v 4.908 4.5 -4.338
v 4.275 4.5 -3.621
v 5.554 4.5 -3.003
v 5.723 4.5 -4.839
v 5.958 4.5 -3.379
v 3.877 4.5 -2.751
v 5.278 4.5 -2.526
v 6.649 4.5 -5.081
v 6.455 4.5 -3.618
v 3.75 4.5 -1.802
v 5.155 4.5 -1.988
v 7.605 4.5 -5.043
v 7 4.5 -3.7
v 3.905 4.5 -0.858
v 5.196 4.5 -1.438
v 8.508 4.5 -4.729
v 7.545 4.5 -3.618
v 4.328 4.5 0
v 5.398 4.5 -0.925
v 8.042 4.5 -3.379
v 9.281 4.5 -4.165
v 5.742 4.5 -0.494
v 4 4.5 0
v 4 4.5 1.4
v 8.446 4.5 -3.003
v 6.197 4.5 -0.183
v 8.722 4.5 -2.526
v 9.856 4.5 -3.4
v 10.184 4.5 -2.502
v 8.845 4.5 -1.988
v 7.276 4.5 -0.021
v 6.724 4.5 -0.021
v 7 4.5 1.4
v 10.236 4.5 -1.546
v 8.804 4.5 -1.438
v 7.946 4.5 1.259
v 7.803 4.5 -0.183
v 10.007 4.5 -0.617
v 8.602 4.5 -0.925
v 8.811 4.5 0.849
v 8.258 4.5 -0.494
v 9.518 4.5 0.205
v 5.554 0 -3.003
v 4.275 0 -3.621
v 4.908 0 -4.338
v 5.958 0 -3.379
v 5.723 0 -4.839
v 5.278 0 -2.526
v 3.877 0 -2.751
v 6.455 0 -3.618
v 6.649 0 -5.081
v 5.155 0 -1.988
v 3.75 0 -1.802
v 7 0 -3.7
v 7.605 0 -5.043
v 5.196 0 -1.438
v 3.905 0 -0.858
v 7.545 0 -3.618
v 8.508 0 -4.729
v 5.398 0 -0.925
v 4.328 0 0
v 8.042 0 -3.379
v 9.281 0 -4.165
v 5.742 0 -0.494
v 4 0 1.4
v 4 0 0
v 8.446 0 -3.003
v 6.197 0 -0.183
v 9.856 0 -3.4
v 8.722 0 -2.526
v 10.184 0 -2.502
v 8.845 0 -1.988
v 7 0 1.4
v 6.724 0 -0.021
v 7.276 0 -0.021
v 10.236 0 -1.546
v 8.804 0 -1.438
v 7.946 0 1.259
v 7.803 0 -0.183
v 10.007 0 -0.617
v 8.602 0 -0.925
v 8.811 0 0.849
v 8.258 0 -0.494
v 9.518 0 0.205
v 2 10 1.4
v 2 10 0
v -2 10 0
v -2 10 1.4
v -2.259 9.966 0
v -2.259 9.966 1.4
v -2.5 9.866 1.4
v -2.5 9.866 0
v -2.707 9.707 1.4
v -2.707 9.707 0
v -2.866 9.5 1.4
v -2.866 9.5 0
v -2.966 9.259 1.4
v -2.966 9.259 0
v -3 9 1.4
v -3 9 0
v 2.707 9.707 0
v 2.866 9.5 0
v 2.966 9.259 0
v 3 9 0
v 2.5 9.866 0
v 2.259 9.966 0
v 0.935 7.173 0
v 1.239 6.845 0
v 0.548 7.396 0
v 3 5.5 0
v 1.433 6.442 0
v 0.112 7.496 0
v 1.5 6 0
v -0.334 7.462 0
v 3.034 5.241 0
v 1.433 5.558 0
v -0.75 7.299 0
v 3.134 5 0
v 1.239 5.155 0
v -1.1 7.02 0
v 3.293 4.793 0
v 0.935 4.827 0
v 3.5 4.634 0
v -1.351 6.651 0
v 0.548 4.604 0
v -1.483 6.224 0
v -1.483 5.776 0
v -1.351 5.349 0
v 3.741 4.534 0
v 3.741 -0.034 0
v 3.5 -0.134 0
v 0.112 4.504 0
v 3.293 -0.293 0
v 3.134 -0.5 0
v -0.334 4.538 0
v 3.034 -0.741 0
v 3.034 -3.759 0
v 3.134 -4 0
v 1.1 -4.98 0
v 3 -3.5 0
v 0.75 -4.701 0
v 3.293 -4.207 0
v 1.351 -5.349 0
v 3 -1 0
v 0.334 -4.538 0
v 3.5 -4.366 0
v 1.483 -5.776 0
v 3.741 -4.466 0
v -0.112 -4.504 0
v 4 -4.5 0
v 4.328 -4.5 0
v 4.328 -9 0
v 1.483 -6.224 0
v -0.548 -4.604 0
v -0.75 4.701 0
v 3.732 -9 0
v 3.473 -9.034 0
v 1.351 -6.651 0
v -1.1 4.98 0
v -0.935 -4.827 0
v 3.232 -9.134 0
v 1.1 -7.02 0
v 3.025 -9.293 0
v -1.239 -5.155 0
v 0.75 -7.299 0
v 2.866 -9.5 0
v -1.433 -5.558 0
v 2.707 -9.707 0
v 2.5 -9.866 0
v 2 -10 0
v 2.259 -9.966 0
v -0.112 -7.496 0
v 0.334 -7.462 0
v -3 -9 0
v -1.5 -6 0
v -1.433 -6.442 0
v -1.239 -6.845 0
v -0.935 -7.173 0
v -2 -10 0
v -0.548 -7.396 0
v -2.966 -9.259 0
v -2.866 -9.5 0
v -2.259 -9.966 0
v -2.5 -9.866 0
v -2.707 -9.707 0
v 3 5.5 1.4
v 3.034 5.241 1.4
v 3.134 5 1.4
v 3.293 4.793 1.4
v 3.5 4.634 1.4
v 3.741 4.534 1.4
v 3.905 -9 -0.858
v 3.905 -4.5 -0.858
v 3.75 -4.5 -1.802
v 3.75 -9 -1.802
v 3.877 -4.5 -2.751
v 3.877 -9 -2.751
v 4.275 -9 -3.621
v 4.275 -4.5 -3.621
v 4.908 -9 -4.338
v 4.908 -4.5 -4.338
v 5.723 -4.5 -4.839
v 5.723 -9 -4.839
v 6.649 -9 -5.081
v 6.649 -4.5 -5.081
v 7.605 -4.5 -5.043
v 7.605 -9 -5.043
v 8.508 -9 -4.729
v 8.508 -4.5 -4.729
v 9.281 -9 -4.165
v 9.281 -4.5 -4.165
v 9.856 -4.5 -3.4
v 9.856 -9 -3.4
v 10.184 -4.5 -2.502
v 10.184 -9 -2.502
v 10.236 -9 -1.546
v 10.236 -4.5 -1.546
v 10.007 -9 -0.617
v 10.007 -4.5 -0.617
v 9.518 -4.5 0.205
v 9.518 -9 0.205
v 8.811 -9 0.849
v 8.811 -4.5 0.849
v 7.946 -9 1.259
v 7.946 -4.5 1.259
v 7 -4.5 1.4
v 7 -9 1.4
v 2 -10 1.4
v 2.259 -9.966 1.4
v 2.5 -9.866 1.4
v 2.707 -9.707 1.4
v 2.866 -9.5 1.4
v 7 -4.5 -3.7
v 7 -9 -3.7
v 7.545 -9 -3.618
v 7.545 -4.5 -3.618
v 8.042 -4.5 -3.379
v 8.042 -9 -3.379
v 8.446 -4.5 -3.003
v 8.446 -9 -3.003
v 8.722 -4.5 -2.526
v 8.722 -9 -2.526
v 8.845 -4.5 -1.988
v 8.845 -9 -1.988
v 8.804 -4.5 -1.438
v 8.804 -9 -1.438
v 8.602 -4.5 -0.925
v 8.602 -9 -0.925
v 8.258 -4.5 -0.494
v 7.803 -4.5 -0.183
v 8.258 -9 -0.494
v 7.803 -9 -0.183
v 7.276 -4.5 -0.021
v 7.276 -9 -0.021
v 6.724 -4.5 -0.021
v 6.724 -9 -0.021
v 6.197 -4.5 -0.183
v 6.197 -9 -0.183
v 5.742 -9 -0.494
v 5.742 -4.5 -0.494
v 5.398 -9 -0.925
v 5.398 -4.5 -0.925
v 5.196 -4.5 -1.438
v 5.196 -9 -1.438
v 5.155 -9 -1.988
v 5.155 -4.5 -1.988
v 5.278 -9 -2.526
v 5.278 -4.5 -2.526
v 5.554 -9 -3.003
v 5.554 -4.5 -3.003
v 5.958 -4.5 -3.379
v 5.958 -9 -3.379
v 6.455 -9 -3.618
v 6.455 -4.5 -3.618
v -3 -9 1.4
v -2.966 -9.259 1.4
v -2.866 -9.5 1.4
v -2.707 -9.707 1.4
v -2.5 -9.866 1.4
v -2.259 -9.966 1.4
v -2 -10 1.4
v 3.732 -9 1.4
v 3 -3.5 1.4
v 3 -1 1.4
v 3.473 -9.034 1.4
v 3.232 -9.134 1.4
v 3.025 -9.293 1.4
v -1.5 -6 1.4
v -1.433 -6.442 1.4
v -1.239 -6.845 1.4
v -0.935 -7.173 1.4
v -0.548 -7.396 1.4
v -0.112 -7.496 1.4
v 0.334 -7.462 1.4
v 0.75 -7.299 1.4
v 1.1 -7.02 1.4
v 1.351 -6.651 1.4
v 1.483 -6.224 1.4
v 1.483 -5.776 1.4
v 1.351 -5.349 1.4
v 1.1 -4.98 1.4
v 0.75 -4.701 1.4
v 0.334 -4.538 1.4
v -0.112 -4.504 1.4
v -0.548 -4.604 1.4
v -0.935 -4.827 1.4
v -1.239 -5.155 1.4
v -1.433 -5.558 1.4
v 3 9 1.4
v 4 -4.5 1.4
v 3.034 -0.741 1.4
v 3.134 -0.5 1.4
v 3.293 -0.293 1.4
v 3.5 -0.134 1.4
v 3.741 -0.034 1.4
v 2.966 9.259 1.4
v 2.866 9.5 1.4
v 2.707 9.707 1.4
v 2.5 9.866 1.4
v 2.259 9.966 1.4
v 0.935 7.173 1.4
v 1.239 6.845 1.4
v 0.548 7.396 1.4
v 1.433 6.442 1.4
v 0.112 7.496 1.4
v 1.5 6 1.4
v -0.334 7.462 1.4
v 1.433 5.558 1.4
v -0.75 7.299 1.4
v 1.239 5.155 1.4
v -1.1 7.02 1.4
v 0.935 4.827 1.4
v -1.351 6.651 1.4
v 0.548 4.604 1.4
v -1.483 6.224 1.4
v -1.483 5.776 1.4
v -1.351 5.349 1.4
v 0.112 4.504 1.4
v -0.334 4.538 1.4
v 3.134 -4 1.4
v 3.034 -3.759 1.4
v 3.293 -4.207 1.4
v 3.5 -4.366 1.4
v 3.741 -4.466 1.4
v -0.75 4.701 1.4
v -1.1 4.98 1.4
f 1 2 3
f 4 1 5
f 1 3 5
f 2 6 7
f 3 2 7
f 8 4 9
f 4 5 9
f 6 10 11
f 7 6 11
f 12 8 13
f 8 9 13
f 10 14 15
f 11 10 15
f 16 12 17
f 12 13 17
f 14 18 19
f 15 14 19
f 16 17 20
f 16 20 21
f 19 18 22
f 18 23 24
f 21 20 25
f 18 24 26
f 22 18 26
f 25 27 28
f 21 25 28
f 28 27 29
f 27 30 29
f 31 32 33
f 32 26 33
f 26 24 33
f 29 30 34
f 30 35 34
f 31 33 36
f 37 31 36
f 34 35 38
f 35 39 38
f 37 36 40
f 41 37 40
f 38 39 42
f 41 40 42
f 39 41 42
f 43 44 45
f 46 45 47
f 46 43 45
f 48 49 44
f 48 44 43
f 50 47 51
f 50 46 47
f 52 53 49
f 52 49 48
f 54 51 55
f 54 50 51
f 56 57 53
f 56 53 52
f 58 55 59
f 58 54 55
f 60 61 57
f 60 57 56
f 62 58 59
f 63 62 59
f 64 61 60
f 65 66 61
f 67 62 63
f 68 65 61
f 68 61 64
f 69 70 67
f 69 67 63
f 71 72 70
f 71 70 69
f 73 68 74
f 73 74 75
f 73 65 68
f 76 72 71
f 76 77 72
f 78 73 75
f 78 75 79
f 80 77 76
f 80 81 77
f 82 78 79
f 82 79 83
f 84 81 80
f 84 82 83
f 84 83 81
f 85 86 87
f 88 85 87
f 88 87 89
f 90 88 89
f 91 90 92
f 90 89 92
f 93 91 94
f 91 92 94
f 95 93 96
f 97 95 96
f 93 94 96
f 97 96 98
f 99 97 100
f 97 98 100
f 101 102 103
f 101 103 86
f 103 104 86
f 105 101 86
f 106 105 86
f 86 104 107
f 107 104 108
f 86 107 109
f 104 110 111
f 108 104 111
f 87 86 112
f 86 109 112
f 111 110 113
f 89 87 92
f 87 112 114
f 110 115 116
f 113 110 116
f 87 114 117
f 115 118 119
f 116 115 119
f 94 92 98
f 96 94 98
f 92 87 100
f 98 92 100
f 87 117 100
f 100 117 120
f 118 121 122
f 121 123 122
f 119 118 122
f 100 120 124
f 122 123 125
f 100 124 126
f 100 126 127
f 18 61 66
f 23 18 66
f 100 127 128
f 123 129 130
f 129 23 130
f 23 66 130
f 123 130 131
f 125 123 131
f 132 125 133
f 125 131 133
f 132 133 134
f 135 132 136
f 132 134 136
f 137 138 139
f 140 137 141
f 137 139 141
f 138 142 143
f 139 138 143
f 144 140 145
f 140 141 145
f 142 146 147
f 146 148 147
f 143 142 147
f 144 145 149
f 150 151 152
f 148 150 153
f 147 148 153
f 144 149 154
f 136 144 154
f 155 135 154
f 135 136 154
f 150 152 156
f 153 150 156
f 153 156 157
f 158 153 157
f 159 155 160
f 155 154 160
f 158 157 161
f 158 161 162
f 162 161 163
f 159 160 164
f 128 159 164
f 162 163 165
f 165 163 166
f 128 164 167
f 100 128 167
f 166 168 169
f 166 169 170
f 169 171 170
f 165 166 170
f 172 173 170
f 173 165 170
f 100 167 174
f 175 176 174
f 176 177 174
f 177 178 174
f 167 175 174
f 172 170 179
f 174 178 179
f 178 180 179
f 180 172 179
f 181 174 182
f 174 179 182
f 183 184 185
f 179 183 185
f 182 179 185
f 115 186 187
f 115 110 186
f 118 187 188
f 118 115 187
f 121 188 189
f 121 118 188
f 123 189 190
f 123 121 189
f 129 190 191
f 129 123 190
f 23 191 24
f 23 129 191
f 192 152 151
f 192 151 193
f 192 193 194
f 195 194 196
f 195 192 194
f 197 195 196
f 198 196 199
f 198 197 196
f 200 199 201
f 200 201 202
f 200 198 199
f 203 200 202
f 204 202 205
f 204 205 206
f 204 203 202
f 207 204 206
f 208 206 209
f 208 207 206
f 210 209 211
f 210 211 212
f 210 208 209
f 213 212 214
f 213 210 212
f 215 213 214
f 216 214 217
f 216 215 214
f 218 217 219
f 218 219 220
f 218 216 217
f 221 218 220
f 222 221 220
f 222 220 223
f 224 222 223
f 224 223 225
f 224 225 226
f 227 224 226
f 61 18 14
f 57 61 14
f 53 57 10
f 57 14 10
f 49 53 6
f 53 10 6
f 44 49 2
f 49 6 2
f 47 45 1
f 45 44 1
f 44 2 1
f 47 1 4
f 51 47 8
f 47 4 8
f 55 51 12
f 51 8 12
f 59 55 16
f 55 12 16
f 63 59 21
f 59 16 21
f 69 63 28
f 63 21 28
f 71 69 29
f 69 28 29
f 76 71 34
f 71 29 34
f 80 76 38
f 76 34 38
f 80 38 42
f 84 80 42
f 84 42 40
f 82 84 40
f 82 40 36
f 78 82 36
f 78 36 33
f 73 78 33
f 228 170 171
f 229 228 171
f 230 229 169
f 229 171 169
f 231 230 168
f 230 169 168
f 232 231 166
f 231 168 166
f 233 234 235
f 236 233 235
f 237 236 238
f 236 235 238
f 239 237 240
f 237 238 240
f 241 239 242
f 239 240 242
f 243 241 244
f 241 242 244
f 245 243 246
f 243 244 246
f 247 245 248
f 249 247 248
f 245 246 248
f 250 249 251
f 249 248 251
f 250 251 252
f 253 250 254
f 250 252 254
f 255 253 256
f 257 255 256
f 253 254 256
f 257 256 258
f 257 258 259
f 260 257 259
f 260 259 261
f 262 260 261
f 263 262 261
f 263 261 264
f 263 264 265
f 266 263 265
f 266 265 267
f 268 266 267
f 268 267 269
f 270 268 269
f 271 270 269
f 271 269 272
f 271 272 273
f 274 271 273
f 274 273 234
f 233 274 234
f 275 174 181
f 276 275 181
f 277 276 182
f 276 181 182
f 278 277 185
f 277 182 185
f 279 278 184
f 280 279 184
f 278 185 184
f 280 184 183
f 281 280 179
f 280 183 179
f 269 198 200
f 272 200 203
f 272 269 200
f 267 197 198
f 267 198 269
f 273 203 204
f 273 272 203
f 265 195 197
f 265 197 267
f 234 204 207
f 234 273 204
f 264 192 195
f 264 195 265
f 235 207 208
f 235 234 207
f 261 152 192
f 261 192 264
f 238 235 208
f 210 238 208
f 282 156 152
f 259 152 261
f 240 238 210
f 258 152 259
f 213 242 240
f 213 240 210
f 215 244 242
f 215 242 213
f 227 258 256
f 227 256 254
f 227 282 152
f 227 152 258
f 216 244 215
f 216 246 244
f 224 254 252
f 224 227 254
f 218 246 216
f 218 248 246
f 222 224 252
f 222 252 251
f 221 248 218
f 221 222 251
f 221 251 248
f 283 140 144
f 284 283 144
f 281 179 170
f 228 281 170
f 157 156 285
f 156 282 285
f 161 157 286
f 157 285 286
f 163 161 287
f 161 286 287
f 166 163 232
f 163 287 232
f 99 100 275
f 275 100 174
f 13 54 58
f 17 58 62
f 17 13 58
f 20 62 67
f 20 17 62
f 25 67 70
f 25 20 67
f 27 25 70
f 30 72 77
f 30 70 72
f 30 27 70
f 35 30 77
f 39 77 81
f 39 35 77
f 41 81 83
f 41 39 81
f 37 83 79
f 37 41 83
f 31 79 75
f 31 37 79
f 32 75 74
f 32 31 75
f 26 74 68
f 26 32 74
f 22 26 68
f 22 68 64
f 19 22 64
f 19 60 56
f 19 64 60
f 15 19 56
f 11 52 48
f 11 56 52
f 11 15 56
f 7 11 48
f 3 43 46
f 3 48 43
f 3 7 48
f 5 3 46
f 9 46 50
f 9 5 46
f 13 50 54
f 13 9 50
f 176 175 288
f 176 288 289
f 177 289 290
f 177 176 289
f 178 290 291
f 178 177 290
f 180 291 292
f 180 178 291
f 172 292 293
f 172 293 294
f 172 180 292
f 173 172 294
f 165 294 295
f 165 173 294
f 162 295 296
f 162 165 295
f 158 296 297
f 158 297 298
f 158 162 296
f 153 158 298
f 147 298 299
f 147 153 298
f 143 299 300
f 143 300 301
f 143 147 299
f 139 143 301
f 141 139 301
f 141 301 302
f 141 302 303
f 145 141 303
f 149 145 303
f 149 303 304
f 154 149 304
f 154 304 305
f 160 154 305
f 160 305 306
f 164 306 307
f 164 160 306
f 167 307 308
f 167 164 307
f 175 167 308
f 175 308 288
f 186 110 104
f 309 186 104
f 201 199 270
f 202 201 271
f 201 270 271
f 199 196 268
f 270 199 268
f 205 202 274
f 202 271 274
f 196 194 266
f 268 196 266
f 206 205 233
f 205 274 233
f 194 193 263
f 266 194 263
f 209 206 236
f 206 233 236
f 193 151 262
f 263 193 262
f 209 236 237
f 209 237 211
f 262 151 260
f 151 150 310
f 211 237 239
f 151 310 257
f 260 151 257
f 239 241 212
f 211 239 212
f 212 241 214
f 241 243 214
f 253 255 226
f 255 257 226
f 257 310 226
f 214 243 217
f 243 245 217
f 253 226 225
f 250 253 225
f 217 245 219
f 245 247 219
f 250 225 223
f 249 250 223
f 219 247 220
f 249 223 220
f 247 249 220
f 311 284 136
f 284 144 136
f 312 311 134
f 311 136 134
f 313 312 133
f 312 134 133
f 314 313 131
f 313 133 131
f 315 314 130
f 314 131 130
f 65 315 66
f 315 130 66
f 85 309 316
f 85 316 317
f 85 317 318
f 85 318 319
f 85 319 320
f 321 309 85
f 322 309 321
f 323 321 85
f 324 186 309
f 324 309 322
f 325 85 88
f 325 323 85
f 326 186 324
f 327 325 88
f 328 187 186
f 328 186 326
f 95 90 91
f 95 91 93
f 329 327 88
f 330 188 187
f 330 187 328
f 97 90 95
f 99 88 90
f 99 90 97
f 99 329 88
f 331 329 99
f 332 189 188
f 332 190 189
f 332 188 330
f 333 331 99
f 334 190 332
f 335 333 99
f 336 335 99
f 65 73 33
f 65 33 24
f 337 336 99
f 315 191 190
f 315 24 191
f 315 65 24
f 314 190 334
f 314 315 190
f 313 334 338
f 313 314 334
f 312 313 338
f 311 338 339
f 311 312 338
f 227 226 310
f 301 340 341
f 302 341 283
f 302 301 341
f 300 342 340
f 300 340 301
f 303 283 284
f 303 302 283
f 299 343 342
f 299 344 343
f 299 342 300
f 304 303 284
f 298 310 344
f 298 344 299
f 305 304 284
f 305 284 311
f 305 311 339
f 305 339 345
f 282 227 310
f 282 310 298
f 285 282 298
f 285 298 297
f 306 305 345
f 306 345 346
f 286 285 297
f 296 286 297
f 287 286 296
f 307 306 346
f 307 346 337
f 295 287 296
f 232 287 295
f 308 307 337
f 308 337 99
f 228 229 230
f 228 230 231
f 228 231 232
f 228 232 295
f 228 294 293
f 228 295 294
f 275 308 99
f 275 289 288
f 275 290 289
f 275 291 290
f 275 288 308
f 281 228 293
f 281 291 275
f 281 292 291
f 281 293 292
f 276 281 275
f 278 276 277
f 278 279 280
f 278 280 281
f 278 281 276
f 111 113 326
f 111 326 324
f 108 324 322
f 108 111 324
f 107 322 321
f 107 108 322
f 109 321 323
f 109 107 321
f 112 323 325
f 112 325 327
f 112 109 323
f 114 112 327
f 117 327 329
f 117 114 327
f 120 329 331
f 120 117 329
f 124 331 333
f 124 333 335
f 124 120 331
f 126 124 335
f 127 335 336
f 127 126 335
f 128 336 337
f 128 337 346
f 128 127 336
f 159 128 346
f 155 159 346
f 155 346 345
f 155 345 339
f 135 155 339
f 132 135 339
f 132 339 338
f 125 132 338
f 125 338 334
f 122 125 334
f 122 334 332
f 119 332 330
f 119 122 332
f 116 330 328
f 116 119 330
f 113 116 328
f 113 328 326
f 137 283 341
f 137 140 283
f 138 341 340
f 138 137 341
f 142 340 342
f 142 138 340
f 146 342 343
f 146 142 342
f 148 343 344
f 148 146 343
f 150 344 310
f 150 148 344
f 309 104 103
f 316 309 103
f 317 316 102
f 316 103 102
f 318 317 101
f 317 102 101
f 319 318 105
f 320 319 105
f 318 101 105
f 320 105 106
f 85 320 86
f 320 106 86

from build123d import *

# Parameters (mm, degrees)
SKETCH_1_R      = 1.5
EXTRUDE_1_DEPTH = 1.4
SKETCH_4_W      = 4
SKETCH_4_H      = 1.4
EXTRUDE_2_DEPTH = 4.5
SKETCH_5_R      = 3.25
SKETCH_5_R_2    = 1.85
EXTRUDE_3_DEPTH = 4.5
FILLET_1_R      = 1


with BuildPart() as part:
    # 草图1 → 凸台-拉伸1 (new body)
    with BuildSketch(Plane.XY):
        with BuildLine():
            Line((-2, -10), (2, -10))
            ThreePointArc((2, -10), (2.707106781, -9.707106781), (3, -9))
            Line((3, -9), (3, 9))
            ThreePointArc((3, 9), (2.707106781, 9.707106781), (2, 10))
            Line((2, 10), (-2, 10))
            ThreePointArc((-2, 10), (-2.707106781, 9.707106781), (-3, 9))
            Line((-3, 9), (-3, -9))
            ThreePointArc((-3, -9), (-2.707106781, -9.707106781), (-2, -10))
        make_face()
        with Locations((0, 6)):
            Circle(SKETCH_1_R, mode=Mode.SUBTRACT)
        with Locations(Location((0, -6, 0), (0, 0, 180))):
            Circle(SKETCH_1_R, mode=Mode.SUBTRACT)
    extrude(amount=EXTRUDE_1_DEPTH)

    # 草图4 → 凸台-拉伸2 (add)
    with BuildSketch(Plane(origin=(0, -9, 0), x_dir=(-1, 0, 0), z_dir=(0, -1, 0))):
        with Locations((-5, -0.7)):
            Rectangle(SKETCH_4_W, SKETCH_4_H)
    extrude_2 = extrude(amount=-EXTRUDE_2_DEPTH)

    # 草图5 → 凸台-拉伸3 (add)
    with BuildSketch(Plane.XZ.offset(9)):
        with Locations((7, -1.85)):
            Circle(SKETCH_5_R)
        with Locations(Location((7, -1.85, 0), (0, 0, 270))):
            Circle(SKETCH_5_R_2, mode=Mode.SUBTRACT)
    extrude_3 = extrude(amount=-EXTRUDE_3_DEPTH)

    # 镜向1: 凸台-拉伸2, 凸台-拉伸3 across plane
    add(extrude_2.mirror(Plane.ZX.offset(-2.25)))
    add(extrude_3.mirror(Plane.ZX.offset(-2.25)))

    # 圆角1
    fillet_1_edges = [part.edges().sort_by_distance(p)[0] for p in [
        (3, -9, 0.7),
        (3, -4.5, 0.7),
        (3, 4.5, 0.7),
        (3, 0, 0.7),
    ]]
    fillet(fillet_1_edges, radius=FILLET_1_R)


solid = part.part
